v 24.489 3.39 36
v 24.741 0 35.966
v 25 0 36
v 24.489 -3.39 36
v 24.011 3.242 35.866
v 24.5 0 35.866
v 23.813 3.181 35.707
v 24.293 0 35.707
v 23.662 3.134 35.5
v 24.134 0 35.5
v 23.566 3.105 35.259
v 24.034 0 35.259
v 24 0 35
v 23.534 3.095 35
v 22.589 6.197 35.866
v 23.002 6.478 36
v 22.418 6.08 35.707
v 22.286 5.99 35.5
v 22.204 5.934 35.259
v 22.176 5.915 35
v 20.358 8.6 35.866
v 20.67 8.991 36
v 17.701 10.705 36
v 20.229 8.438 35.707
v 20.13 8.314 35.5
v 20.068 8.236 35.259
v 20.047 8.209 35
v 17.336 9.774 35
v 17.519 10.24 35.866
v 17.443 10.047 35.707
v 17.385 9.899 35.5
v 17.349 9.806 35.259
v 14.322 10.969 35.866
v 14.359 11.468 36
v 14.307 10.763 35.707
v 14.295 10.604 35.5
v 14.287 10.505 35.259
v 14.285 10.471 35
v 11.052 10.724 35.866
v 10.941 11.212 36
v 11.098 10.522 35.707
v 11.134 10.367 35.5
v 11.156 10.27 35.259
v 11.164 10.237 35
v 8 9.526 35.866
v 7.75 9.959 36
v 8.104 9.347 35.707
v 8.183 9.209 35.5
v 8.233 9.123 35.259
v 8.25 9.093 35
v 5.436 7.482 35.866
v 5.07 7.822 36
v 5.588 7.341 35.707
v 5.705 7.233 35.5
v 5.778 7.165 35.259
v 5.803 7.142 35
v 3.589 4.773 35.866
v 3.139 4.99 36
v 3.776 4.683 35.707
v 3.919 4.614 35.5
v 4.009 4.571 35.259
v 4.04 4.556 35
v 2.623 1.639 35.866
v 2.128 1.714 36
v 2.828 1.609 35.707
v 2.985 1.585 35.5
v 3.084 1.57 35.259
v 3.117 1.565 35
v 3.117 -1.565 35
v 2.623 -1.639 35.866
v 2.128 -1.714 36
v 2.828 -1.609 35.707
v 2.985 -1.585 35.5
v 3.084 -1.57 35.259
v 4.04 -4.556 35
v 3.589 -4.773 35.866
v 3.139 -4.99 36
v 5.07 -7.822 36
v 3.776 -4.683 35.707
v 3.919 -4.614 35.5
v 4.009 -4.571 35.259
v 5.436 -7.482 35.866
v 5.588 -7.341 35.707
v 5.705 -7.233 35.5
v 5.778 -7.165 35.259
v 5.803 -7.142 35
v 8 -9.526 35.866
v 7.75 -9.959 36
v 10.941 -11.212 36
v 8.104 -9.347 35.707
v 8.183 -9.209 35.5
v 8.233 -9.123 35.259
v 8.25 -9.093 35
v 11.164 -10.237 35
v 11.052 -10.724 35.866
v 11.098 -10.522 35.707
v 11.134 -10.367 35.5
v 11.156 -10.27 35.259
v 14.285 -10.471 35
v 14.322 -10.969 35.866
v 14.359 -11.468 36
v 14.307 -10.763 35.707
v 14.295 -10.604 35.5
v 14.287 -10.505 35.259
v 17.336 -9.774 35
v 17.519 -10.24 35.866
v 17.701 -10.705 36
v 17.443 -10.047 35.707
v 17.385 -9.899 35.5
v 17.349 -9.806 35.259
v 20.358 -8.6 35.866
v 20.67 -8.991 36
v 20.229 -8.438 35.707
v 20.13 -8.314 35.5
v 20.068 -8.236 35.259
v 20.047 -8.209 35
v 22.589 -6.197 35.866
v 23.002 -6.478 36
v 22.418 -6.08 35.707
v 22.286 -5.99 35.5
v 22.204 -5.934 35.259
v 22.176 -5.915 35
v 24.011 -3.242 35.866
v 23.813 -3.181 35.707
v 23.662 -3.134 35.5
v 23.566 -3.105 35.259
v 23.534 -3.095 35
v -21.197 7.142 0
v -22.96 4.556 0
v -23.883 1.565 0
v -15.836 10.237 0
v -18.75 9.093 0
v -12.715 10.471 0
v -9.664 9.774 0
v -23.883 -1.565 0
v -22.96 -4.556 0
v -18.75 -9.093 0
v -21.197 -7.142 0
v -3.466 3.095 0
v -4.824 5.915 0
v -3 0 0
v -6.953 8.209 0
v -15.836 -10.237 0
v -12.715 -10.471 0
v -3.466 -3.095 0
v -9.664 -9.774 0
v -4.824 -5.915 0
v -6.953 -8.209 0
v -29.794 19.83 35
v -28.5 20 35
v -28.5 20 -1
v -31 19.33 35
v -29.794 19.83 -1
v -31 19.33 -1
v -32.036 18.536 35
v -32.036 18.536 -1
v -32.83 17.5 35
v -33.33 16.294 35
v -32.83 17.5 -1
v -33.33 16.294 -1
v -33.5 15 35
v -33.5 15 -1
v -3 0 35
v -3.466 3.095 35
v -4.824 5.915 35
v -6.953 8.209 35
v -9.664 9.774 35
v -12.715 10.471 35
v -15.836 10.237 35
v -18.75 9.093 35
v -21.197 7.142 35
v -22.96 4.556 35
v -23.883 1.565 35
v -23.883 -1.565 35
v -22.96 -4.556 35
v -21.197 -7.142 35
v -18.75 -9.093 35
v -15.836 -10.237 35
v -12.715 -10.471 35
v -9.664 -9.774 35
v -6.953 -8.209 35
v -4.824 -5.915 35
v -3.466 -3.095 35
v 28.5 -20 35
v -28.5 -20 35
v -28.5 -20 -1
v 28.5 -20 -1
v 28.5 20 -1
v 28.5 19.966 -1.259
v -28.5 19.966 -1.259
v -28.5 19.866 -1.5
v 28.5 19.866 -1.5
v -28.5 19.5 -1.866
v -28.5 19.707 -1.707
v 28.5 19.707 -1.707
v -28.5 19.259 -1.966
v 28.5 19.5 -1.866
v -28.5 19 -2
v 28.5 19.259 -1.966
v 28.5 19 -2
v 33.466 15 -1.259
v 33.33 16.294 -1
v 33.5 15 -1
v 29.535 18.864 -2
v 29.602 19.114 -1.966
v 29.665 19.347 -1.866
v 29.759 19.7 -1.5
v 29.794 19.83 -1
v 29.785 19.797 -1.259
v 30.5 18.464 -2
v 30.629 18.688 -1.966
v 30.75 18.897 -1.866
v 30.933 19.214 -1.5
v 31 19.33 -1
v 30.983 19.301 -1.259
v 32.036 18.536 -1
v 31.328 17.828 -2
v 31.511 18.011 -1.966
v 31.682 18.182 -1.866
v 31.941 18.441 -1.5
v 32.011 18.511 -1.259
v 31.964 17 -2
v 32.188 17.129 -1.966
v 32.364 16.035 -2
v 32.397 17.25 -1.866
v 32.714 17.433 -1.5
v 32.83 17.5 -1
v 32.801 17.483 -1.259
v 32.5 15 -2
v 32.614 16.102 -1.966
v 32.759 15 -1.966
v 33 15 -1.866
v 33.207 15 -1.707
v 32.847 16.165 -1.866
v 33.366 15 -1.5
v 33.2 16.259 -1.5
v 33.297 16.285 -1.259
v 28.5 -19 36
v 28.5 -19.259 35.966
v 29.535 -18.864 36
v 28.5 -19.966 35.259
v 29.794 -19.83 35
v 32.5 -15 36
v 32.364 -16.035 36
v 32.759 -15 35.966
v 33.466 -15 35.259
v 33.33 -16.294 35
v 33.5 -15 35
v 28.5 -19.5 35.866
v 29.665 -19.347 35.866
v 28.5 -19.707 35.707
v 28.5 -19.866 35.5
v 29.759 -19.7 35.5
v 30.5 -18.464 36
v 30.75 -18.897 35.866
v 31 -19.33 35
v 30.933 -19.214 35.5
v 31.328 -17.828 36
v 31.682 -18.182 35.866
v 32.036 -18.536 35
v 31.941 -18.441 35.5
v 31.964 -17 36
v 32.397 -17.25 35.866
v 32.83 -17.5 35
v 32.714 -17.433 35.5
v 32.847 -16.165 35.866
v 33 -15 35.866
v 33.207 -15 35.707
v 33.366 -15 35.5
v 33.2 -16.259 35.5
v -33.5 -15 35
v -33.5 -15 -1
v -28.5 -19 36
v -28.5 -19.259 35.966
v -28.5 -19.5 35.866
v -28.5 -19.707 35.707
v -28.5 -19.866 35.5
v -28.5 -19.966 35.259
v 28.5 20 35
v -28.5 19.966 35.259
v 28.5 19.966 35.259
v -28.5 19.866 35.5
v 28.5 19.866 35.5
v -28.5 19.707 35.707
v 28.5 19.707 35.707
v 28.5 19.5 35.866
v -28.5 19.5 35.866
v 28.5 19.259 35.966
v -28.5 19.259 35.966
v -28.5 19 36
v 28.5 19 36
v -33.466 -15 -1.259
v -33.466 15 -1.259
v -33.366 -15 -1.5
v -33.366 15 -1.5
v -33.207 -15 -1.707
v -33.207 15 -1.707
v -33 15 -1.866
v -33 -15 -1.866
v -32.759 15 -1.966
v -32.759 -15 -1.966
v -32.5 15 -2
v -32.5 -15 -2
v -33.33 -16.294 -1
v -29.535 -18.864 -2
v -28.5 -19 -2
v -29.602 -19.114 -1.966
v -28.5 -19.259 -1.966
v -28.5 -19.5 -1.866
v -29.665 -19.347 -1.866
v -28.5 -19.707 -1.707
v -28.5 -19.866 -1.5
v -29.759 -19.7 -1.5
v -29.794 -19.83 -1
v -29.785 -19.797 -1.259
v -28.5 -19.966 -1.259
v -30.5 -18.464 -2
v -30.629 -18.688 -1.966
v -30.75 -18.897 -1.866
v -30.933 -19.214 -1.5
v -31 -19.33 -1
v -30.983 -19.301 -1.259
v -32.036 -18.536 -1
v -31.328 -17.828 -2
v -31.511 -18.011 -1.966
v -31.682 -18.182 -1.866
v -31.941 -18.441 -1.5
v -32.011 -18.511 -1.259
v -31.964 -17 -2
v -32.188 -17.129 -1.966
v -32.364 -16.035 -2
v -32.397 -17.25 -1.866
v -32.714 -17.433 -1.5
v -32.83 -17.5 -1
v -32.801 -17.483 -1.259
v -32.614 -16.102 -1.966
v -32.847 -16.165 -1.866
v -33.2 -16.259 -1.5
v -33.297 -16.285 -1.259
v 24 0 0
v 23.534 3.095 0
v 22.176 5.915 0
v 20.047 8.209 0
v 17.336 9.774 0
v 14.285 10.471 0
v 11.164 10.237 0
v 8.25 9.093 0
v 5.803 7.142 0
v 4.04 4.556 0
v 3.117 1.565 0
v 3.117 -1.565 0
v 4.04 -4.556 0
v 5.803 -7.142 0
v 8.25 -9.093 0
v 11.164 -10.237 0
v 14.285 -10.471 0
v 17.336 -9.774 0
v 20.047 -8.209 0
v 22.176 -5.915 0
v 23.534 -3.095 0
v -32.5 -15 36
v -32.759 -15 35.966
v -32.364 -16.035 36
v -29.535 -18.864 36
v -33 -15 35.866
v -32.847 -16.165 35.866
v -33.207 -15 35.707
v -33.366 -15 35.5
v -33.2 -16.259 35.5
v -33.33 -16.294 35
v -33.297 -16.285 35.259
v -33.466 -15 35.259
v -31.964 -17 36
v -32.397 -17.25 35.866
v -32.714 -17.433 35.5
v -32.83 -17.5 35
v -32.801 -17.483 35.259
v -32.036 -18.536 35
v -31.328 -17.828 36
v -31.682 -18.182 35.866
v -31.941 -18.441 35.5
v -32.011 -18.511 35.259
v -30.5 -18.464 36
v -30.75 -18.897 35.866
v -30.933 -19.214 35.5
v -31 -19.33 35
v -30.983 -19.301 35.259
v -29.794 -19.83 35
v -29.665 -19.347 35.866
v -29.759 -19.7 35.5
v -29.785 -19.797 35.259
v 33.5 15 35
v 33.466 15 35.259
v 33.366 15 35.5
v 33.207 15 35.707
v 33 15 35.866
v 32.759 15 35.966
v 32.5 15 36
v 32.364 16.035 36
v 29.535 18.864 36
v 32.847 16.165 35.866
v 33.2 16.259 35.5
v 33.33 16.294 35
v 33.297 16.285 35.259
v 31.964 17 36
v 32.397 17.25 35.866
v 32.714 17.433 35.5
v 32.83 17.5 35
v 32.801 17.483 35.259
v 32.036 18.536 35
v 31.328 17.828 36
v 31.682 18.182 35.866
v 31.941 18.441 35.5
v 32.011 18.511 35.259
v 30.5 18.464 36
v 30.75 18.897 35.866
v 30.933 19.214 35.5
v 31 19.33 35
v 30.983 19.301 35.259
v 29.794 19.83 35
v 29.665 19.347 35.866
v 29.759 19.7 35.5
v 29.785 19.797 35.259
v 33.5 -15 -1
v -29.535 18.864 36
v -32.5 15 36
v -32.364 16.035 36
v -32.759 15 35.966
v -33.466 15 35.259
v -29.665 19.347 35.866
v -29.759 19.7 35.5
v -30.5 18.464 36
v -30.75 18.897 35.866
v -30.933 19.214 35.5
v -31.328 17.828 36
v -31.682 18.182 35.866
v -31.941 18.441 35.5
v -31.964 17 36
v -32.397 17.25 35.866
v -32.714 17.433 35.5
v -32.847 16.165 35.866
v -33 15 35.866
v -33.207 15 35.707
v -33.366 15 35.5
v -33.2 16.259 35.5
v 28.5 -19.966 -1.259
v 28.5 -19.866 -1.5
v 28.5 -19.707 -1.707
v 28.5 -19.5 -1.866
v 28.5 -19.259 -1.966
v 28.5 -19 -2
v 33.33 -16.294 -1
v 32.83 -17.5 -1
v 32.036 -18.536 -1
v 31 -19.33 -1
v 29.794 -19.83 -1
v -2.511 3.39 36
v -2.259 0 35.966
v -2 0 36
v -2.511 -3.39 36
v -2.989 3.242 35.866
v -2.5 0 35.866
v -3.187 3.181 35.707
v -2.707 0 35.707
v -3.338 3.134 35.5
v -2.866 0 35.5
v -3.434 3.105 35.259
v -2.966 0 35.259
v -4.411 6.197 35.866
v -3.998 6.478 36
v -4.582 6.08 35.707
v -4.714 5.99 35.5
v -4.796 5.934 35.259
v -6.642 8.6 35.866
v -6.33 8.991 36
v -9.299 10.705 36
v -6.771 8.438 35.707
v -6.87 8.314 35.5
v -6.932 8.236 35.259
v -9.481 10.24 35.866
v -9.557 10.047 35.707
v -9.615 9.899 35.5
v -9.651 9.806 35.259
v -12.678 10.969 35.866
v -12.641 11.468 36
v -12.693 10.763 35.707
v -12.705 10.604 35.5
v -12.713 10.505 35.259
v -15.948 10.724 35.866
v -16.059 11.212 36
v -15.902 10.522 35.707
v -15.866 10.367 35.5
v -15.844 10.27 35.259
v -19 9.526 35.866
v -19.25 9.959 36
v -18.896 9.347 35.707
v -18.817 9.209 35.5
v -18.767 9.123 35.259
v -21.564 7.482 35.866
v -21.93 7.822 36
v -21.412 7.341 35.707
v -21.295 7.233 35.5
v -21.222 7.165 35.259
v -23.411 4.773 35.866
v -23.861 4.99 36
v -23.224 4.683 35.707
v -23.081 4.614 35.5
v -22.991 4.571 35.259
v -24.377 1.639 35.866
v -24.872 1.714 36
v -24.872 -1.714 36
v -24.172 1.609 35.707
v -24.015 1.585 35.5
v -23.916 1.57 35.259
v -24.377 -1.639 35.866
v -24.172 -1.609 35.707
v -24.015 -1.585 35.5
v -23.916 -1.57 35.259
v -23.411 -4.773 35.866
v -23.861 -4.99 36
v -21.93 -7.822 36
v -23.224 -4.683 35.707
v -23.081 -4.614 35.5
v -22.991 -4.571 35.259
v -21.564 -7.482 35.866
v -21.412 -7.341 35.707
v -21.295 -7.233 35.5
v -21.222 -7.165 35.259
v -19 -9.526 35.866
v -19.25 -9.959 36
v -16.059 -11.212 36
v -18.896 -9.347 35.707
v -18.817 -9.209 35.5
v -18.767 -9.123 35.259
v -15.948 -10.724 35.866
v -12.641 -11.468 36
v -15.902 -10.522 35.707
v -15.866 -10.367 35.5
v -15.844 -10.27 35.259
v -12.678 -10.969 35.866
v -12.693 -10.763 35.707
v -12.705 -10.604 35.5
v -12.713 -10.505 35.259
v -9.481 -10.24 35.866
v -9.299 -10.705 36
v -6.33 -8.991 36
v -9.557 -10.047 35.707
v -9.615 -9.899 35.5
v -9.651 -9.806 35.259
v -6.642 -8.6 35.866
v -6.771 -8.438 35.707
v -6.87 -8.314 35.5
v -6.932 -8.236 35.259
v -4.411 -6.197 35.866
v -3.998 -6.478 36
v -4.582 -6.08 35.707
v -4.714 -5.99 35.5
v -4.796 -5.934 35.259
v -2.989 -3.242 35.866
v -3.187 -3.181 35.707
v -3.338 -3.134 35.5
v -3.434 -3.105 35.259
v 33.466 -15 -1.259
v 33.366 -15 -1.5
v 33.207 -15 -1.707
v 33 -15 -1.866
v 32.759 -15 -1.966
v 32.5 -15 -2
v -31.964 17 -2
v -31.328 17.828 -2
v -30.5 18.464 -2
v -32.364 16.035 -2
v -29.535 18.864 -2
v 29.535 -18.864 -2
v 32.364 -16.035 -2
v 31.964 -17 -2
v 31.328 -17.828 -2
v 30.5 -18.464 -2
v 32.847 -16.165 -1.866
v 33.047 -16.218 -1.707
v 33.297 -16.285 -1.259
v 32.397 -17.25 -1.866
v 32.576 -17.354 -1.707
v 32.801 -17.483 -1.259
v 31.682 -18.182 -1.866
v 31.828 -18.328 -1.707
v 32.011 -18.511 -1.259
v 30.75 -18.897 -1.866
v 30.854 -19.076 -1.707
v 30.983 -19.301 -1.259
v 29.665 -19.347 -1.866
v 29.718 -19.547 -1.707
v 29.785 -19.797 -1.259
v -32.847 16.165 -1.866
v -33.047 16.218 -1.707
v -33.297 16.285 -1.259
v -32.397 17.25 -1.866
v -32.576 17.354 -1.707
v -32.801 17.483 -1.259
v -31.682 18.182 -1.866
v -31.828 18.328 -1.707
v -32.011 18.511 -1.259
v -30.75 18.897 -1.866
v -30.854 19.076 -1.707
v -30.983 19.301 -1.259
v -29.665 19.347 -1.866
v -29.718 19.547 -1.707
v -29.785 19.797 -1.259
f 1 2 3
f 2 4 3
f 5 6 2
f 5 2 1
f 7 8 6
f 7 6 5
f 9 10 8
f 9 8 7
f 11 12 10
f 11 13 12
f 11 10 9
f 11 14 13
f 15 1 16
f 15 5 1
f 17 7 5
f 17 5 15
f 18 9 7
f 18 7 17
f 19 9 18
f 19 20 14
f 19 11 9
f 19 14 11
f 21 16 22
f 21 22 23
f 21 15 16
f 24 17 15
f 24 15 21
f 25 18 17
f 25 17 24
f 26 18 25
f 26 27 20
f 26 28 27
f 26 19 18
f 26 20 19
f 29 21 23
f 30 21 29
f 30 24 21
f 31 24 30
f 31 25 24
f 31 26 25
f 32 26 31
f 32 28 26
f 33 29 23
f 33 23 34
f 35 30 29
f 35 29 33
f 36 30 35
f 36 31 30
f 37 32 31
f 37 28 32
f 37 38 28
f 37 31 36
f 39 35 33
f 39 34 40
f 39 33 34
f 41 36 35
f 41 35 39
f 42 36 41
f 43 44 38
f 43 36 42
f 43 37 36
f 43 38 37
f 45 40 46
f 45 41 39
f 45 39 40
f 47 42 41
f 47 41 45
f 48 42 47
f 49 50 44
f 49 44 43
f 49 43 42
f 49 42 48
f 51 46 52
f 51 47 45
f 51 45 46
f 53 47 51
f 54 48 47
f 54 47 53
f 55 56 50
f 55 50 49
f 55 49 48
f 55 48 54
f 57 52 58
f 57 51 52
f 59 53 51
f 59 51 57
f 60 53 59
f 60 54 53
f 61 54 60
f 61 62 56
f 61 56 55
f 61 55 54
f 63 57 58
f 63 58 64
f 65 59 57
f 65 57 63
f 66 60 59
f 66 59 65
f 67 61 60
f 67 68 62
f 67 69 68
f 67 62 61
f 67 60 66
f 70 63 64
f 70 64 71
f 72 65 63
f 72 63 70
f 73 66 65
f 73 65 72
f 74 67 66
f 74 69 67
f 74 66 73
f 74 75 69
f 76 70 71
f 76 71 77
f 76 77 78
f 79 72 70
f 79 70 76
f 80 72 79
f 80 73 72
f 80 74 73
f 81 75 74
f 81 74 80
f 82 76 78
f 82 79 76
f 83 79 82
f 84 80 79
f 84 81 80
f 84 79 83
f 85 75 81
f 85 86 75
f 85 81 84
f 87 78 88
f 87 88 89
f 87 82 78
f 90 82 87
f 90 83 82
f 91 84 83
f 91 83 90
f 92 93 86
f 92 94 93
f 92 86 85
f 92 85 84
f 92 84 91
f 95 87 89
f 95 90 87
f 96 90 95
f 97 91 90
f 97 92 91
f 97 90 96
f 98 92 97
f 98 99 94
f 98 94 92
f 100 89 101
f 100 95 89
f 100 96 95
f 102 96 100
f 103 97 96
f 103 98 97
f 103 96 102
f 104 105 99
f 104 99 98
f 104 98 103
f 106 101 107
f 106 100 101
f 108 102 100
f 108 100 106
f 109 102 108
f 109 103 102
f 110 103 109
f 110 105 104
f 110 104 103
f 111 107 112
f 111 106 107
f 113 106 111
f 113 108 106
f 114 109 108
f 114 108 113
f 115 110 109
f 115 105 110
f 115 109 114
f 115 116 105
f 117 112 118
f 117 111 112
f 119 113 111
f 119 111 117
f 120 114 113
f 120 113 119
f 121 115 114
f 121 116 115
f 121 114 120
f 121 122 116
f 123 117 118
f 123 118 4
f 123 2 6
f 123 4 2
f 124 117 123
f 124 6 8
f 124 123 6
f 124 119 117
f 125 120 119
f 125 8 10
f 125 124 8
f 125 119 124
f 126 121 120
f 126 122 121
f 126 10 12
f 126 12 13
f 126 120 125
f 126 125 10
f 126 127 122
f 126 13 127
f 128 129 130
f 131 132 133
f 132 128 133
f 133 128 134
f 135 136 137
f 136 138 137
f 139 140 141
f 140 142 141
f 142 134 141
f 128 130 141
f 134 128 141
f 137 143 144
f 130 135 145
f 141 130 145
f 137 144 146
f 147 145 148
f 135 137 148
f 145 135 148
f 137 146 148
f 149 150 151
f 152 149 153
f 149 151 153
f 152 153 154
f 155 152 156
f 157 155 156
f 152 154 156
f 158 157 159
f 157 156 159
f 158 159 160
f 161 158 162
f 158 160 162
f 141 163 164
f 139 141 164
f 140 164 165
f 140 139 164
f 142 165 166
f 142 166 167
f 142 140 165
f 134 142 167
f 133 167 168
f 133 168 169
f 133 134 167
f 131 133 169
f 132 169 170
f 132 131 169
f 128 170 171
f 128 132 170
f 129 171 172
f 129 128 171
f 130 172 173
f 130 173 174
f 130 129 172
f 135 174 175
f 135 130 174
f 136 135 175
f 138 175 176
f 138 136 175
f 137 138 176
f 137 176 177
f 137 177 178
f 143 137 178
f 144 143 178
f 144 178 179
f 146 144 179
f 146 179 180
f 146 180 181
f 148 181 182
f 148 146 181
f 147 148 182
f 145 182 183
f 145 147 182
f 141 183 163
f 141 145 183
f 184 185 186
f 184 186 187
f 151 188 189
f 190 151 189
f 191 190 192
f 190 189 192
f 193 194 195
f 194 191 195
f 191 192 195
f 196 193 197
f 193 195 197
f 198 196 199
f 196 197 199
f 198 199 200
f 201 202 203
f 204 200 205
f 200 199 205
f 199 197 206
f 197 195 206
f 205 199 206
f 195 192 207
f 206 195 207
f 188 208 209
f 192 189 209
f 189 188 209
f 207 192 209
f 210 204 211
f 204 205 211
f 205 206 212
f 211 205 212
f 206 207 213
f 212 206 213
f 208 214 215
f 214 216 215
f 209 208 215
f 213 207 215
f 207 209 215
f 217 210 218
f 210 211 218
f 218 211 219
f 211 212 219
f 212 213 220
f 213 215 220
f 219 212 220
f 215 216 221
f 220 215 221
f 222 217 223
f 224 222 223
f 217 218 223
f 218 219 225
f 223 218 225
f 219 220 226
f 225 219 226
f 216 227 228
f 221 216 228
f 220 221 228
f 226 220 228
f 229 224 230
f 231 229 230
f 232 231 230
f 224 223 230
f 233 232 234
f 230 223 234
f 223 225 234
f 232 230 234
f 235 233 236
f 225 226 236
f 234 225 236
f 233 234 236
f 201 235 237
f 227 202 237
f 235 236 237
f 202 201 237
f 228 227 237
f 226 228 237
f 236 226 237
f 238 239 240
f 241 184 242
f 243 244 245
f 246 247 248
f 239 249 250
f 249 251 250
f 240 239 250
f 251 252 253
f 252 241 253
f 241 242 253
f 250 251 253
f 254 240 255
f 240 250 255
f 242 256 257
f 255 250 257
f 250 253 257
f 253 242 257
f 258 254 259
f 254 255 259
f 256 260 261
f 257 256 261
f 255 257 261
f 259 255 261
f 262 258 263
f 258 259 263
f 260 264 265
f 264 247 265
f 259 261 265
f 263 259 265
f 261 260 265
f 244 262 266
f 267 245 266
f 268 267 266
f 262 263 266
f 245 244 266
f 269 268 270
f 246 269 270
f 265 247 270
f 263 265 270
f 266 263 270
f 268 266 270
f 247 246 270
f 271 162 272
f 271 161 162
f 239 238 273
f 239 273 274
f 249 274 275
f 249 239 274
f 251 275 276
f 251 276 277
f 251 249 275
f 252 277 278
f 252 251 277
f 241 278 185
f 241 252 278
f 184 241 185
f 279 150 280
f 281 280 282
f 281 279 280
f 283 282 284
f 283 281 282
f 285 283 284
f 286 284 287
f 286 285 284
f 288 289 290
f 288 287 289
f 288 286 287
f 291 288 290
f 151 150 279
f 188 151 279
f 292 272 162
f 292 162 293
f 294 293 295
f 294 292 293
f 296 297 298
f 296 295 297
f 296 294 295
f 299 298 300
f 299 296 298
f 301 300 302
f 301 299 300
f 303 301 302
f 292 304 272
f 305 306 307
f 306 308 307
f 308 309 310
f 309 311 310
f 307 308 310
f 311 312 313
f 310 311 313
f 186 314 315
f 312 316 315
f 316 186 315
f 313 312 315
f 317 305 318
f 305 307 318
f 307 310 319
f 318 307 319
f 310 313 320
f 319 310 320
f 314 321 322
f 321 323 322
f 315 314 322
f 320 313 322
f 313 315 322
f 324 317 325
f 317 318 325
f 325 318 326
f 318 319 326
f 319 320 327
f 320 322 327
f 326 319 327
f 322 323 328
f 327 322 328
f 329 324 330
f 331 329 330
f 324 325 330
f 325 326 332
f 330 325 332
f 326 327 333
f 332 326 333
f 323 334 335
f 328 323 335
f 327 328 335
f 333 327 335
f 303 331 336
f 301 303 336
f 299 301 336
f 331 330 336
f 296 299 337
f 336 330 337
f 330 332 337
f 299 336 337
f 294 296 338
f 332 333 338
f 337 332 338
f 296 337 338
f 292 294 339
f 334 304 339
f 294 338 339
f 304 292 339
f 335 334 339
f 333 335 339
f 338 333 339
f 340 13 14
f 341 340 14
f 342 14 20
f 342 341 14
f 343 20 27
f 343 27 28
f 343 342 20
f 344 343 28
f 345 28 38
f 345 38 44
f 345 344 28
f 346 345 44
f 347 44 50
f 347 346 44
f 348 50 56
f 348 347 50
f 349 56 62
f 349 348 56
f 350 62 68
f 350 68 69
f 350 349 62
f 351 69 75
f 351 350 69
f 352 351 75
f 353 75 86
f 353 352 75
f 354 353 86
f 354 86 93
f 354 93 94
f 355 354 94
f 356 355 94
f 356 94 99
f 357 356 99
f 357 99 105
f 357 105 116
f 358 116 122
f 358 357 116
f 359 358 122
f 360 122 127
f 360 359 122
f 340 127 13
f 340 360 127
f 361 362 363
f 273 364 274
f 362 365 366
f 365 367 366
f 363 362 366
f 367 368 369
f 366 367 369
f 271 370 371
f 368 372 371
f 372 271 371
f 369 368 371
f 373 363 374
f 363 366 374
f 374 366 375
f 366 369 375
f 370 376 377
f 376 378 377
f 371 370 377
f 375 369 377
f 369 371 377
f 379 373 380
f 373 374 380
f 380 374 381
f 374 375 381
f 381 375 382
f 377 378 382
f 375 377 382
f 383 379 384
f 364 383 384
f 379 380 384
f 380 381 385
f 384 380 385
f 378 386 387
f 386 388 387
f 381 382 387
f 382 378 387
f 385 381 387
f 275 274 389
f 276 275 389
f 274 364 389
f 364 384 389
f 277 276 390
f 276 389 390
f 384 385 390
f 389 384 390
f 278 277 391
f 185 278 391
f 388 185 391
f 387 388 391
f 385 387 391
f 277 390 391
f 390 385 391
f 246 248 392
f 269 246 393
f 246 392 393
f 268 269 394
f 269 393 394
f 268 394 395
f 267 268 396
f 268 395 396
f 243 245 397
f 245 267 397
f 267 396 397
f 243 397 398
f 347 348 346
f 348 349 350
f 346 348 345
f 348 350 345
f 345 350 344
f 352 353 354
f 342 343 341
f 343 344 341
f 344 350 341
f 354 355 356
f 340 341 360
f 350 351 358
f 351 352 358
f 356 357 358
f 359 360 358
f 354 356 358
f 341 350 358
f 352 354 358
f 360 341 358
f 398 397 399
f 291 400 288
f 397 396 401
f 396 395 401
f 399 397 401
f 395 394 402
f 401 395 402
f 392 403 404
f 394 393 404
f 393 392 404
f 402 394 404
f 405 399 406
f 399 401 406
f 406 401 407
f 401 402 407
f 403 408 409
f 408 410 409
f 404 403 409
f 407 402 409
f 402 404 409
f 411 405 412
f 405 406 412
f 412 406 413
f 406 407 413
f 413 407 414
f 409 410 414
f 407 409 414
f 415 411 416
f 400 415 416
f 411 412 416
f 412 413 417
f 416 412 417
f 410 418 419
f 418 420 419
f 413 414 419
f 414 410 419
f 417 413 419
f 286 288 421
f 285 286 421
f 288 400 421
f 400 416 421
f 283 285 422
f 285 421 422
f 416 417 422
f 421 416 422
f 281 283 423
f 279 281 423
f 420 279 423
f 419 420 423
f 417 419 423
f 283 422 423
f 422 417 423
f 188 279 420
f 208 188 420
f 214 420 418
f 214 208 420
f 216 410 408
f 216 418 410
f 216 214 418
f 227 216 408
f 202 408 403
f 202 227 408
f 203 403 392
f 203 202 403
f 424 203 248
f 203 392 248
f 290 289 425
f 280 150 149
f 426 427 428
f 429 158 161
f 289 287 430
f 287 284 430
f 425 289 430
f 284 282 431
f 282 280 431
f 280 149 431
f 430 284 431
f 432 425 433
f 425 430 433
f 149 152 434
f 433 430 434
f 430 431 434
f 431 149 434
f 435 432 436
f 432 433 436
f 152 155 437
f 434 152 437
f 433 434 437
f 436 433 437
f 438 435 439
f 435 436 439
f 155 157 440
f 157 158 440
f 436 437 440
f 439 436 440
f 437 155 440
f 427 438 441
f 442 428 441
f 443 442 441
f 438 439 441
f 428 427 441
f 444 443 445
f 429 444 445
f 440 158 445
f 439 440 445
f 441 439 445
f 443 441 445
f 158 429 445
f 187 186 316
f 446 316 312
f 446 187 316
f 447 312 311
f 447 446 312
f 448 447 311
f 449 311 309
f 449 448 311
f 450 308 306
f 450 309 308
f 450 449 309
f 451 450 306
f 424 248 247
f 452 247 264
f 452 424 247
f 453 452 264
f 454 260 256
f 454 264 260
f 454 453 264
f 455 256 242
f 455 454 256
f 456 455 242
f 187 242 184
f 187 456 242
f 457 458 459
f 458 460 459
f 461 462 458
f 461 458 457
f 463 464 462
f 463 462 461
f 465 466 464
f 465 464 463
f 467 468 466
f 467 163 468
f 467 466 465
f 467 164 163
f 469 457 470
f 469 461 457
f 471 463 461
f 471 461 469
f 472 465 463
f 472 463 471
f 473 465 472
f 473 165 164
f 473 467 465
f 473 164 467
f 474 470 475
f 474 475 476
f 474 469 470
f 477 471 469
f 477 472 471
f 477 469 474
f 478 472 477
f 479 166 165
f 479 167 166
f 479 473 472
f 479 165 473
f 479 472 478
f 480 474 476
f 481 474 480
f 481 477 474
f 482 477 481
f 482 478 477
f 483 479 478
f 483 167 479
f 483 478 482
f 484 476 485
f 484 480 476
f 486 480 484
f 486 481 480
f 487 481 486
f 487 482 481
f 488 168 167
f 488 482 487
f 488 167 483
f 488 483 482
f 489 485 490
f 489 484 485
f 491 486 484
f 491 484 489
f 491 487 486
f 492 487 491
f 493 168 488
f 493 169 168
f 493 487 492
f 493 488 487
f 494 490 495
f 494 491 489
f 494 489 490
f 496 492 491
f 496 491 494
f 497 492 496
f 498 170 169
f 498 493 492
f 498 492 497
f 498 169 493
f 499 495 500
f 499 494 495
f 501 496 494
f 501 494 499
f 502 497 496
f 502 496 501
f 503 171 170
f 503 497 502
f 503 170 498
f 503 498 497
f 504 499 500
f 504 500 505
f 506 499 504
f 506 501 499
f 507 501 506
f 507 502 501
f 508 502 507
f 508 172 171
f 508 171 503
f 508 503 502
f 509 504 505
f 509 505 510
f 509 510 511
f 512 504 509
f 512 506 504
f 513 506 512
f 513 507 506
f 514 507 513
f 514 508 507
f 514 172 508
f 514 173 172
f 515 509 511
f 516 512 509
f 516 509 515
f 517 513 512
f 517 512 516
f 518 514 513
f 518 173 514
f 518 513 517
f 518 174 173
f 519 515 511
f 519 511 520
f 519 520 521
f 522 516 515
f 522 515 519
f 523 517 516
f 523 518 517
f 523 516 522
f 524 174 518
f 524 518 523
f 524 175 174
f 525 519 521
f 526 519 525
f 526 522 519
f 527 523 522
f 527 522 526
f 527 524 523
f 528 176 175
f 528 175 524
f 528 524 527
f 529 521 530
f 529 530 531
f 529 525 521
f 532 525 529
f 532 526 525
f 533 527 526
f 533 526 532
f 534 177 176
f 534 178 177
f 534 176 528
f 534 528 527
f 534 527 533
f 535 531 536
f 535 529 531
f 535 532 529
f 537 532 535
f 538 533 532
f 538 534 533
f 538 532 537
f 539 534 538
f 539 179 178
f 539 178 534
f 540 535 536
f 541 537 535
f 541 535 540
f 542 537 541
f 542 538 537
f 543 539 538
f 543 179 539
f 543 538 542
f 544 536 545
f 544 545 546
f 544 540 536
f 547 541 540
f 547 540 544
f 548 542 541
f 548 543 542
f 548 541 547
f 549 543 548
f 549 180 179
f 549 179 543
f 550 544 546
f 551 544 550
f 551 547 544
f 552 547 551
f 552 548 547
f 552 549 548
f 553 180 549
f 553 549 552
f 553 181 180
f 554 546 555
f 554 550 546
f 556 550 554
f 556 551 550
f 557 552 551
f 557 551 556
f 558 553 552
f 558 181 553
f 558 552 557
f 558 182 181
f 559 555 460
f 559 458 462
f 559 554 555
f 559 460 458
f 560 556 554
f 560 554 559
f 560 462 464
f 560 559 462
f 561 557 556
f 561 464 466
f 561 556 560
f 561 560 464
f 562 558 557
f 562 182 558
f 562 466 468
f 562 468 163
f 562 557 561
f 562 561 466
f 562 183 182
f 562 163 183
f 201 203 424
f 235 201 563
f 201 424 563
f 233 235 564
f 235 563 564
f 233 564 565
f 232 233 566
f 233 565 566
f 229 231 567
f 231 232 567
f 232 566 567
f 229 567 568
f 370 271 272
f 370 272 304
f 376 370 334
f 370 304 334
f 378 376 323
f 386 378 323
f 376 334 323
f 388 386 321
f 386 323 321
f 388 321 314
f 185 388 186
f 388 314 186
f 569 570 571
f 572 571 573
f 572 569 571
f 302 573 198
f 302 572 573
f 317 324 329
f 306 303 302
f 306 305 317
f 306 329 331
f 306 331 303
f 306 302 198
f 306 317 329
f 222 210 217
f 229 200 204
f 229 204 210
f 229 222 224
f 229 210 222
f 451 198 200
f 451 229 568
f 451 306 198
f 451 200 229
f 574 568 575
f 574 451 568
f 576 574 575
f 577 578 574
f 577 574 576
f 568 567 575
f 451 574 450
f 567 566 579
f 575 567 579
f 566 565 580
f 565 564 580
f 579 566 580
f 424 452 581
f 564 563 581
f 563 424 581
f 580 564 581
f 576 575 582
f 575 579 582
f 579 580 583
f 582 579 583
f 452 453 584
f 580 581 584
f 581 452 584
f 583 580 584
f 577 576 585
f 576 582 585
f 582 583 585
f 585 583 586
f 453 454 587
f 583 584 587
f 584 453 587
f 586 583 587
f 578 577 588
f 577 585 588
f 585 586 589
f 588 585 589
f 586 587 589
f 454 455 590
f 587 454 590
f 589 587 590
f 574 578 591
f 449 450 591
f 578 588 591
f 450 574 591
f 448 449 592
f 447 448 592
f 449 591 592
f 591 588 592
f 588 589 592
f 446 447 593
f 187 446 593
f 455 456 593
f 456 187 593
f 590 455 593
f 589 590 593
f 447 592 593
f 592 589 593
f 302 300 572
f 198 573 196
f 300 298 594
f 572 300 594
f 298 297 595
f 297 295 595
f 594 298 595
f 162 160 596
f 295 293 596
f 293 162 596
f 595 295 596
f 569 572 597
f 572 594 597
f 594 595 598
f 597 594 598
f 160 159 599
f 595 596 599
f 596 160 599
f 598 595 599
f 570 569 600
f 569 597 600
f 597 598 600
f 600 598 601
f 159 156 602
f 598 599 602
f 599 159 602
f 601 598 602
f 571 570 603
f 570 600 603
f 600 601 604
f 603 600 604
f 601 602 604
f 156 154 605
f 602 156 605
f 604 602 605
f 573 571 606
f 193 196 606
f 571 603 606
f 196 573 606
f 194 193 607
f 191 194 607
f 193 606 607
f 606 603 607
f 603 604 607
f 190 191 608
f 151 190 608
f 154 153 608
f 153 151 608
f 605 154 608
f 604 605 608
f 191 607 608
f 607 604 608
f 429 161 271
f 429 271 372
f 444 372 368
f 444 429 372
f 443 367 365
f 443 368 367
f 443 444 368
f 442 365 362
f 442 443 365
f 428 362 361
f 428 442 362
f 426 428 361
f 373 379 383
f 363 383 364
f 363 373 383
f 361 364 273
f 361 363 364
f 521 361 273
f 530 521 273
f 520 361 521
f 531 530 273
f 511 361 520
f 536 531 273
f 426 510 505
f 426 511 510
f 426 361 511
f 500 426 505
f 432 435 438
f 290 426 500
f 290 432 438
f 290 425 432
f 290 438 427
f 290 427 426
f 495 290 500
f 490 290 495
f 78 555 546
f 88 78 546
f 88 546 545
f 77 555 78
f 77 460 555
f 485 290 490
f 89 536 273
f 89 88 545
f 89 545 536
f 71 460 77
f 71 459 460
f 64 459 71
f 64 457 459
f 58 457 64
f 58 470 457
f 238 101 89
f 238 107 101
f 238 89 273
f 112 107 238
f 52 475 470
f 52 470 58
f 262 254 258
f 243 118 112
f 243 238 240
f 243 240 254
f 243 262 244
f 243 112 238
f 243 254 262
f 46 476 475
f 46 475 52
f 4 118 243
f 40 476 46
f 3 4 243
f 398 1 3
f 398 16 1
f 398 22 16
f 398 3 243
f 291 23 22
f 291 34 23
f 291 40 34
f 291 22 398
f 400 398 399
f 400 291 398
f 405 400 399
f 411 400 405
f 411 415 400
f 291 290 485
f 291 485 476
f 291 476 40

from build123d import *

# Parameters (mm, degrees)
F0_W         = 67
F0_H         = 40
F0_R         = 10.5
F1_DEPTH     = 36
F2_W         = 67
F2_H         = 40
F3_DEPTH     = 2
F4_R         = 1
F5_T1_DEPTH  = 38
F5_T4_ANGLE  = 90
F5_T6_ANGLE  = 90
F5_T8_ANGLE  = 90
F5_T10_ANGLE = 90
F5_T12_ANGLE = 90
F5_T14_ANGLE = 90
F5_T16_ANGLE = 90
F5_T18_ANGLE = 90


# Not quite as in the source:
# - a fillet or chamfer that OpenCascade refuses, or shapes differently, is made with other operations: its cross-section is extruded or revolved along the edge and cut away or added


with BuildPart() as f1:
    # F0 (on Top) → F1 (new body)
    with BuildSketch(Plane.XY):
        Rectangle(F0_W, F0_H)
        with Locations((-13.5, 0)):
            Circle(F0_R, mode=Mode.SUBTRACT)
        with Locations((13.5, 0)):
            Circle(F0_R, mode=Mode.SUBTRACT)
    extrude(amount=F1_DEPTH)

    # F2 (on face) → F3 (join)
    with BuildSketch(Plane(origin=(0, 0, 0), x_dir=(1, 0, 0), z_dir=(0, 0, -1))):
        Rectangle(F2_W, F2_H)
    extrude(amount=F3_DEPTH)

    # F4
    f4_edges = [f1.edges().sort_by_distance(p)[0] for p in [
        (0, 20, 36),
        (-33.5, 0, 36),
        (0, -20, 36),
        (33.5, 0, 36),
        (-24, 0, 36),
        (3, 0, 36),
        (0, 20, -2),
        (33.5, 0, -2),
        (0, -20, -2),
        (-33.5, 0, -2),
    ]]
    fillet(f4_edges, radius=F4_R)

    # F5: fillet of radius 5 on 4 edges, made by hand

    # F5_s2 → F5_t1 (cut)
    with BuildSketch(Plane.XY.offset(-2)):
        with BuildLine():
            ThreePointArc((28.5, 20), (32.0355339059, 18.5355339059), (33.5, 15))
            Line((33.5, 15), (33.5, 20))
            Line((33.5, 20), (28.5, 20))
        make_face()
        with BuildLine():
            ThreePointArc((33.5, -15), (32.0355339059, -18.5355339059), (28.5, -20))
            Line((28.5, -20), (33.5, -20))
            Line((33.5, -20), (33.5, -15))
        make_face()
        with BuildLine():
            ThreePointArc((-33.5, -15), (-32.0355339059, -18.5355339059), (-28.5, -20))
            Line((-28.5, -20), (-33.5, -20))
            Line((-33.5, -20), (-33.5, -15))
        make_face()
        with BuildLine():
            ThreePointArc((-28.5, 20), (-32.0355339059, 18.5355339059), (-33.5, 15))
            Line((-33.5, 15), (-33.5, 20))
            Line((-33.5, 20), (-28.5, 20))
        make_face()
    extrude(amount=F5_T1_DEPTH, mode=Mode.SUBTRACT)

    # F5_s3 → F5_t4 (revolve, cut)
    with BuildSketch(Plane.XZ.offset(-15)):
        with BuildLine():
            ThreePointArc((-32.5, -2), (-33.2071067812, -1.7071067812), (-33.5, -1))
            Line((-33.5, -1), (-33.5, -2))
            Line((-33.5, -2), (-32.5, -2))
        make_face()
    revolve(axis=Axis((-28.5, 15, -2), (0, 0, -1)), revolution_arc=F5_T4_ANGLE, mode=Mode.SUBTRACT)

    # F5_s5 → F5_t6 (revolve, cut)
    with BuildSketch(Plane.YZ.offset(-28.5)):
        with BuildLine():
            ThreePointArc((19, 36), (19.7071067812, 35.7071067812), (20, 35))
            Line((20, 35), (20, 36))
            Line((20, 36), (19, 36))
        make_face()
    revolve(axis=Axis((-28.5, 15, 36), (0, 0, 1)), revolution_arc=F5_T6_ANGLE, mode=Mode.SUBTRACT)

    # F5_s7 → F5_t8 (revolve, cut)
    with BuildSketch(Plane.YZ.offset(-28.5)):
        with BuildLine():
            ThreePointArc((-19, -2), (-19.7071067812, -1.7071067812), (-20, -1))
            Line((-20, -1), (-20, -2))
            Line((-20, -2), (-19, -2))
        make_face()
    revolve(axis=Axis((-28.5, -15, -2), (0, 0, -1)), revolution_arc=F5_T8_ANGLE, mode=Mode.SUBTRACT)

    # F5_s9 → F5_t10 (revolve, cut)
    with BuildSketch(Plane.XZ.offset(15)):
        with BuildLine():
            ThreePointArc((-32.5, 36), (-33.2071067812, 35.7071067812), (-33.5, 35))
            Line((-33.5, 35), (-33.5, 36))
            Line((-33.5, 36), (-32.5, 36))
        make_face()
    revolve(axis=Axis((-28.5, -15, 36), (0, 0, 1)), revolution_arc=F5_T10_ANGLE, mode=Mode.SUBTRACT)

    # F5_s11 → F5_t12 (revolve, cut)
    with BuildSketch(Plane.YZ.offset(28.5)):
        with BuildLine():
            ThreePointArc((-19, 36), (-19.7071067812, 35.7071067812), (-20, 35))
            Line((-20, 35), (-20, 36))
            Line((-20, 36), (-19, 36))
        make_face()
    revolve(axis=Axis((28.5, -15, 36), (0, 0, 1)), revolution_arc=F5_T12_ANGLE, mode=Mode.SUBTRACT)

    # F5_s13 → F5_t14 (revolve, cut)
    with BuildSketch(Plane.XZ.offset(15)):
        with BuildLine():
            ThreePointArc((32.5, -2), (33.2071067812, -1.7071067812), (33.5, -1))
            Line((33.5, -1), (33.5, -2))
            Line((33.5, -2), (32.5, -2))
        make_face()
    revolve(axis=Axis((28.5, -15, -2), (0, 0, -1)), revolution_arc=F5_T14_ANGLE, mode=Mode.SUBTRACT)

    # F5_s15 → F5_t16 (revolve, cut)
    with BuildSketch(Plane.XZ.offset(-15)):
        with BuildLine():
            ThreePointArc((32.5, 36), (33.2071067812, 35.7071067812), (33.5, 35))
            Line((33.5, 35), (33.5, 36))
            Line((33.5, 36), (32.5, 36))
        make_face()
    revolve(axis=Axis((28.5, 15, 36), (0, 0, 1)), revolution_arc=F5_T16_ANGLE, mode=Mode.SUBTRACT)

    # F5_s17 → F5_t18 (revolve, cut)
    with BuildSketch(Plane.YZ.offset(28.5)):
        with BuildLine():
            ThreePointArc((19, -2), (19.7071067812, -1.7071067812), (20, -1))
            Line((20, -1), (20, -2))
            Line((20, -2), (19, -2))
        make_face()
    revolve(axis=Axis((28.5, 15, -2), (0, 0, -1)), revolution_arc=F5_T18_ANGLE, mode=Mode.SUBTRACT)


solid = f1.part
